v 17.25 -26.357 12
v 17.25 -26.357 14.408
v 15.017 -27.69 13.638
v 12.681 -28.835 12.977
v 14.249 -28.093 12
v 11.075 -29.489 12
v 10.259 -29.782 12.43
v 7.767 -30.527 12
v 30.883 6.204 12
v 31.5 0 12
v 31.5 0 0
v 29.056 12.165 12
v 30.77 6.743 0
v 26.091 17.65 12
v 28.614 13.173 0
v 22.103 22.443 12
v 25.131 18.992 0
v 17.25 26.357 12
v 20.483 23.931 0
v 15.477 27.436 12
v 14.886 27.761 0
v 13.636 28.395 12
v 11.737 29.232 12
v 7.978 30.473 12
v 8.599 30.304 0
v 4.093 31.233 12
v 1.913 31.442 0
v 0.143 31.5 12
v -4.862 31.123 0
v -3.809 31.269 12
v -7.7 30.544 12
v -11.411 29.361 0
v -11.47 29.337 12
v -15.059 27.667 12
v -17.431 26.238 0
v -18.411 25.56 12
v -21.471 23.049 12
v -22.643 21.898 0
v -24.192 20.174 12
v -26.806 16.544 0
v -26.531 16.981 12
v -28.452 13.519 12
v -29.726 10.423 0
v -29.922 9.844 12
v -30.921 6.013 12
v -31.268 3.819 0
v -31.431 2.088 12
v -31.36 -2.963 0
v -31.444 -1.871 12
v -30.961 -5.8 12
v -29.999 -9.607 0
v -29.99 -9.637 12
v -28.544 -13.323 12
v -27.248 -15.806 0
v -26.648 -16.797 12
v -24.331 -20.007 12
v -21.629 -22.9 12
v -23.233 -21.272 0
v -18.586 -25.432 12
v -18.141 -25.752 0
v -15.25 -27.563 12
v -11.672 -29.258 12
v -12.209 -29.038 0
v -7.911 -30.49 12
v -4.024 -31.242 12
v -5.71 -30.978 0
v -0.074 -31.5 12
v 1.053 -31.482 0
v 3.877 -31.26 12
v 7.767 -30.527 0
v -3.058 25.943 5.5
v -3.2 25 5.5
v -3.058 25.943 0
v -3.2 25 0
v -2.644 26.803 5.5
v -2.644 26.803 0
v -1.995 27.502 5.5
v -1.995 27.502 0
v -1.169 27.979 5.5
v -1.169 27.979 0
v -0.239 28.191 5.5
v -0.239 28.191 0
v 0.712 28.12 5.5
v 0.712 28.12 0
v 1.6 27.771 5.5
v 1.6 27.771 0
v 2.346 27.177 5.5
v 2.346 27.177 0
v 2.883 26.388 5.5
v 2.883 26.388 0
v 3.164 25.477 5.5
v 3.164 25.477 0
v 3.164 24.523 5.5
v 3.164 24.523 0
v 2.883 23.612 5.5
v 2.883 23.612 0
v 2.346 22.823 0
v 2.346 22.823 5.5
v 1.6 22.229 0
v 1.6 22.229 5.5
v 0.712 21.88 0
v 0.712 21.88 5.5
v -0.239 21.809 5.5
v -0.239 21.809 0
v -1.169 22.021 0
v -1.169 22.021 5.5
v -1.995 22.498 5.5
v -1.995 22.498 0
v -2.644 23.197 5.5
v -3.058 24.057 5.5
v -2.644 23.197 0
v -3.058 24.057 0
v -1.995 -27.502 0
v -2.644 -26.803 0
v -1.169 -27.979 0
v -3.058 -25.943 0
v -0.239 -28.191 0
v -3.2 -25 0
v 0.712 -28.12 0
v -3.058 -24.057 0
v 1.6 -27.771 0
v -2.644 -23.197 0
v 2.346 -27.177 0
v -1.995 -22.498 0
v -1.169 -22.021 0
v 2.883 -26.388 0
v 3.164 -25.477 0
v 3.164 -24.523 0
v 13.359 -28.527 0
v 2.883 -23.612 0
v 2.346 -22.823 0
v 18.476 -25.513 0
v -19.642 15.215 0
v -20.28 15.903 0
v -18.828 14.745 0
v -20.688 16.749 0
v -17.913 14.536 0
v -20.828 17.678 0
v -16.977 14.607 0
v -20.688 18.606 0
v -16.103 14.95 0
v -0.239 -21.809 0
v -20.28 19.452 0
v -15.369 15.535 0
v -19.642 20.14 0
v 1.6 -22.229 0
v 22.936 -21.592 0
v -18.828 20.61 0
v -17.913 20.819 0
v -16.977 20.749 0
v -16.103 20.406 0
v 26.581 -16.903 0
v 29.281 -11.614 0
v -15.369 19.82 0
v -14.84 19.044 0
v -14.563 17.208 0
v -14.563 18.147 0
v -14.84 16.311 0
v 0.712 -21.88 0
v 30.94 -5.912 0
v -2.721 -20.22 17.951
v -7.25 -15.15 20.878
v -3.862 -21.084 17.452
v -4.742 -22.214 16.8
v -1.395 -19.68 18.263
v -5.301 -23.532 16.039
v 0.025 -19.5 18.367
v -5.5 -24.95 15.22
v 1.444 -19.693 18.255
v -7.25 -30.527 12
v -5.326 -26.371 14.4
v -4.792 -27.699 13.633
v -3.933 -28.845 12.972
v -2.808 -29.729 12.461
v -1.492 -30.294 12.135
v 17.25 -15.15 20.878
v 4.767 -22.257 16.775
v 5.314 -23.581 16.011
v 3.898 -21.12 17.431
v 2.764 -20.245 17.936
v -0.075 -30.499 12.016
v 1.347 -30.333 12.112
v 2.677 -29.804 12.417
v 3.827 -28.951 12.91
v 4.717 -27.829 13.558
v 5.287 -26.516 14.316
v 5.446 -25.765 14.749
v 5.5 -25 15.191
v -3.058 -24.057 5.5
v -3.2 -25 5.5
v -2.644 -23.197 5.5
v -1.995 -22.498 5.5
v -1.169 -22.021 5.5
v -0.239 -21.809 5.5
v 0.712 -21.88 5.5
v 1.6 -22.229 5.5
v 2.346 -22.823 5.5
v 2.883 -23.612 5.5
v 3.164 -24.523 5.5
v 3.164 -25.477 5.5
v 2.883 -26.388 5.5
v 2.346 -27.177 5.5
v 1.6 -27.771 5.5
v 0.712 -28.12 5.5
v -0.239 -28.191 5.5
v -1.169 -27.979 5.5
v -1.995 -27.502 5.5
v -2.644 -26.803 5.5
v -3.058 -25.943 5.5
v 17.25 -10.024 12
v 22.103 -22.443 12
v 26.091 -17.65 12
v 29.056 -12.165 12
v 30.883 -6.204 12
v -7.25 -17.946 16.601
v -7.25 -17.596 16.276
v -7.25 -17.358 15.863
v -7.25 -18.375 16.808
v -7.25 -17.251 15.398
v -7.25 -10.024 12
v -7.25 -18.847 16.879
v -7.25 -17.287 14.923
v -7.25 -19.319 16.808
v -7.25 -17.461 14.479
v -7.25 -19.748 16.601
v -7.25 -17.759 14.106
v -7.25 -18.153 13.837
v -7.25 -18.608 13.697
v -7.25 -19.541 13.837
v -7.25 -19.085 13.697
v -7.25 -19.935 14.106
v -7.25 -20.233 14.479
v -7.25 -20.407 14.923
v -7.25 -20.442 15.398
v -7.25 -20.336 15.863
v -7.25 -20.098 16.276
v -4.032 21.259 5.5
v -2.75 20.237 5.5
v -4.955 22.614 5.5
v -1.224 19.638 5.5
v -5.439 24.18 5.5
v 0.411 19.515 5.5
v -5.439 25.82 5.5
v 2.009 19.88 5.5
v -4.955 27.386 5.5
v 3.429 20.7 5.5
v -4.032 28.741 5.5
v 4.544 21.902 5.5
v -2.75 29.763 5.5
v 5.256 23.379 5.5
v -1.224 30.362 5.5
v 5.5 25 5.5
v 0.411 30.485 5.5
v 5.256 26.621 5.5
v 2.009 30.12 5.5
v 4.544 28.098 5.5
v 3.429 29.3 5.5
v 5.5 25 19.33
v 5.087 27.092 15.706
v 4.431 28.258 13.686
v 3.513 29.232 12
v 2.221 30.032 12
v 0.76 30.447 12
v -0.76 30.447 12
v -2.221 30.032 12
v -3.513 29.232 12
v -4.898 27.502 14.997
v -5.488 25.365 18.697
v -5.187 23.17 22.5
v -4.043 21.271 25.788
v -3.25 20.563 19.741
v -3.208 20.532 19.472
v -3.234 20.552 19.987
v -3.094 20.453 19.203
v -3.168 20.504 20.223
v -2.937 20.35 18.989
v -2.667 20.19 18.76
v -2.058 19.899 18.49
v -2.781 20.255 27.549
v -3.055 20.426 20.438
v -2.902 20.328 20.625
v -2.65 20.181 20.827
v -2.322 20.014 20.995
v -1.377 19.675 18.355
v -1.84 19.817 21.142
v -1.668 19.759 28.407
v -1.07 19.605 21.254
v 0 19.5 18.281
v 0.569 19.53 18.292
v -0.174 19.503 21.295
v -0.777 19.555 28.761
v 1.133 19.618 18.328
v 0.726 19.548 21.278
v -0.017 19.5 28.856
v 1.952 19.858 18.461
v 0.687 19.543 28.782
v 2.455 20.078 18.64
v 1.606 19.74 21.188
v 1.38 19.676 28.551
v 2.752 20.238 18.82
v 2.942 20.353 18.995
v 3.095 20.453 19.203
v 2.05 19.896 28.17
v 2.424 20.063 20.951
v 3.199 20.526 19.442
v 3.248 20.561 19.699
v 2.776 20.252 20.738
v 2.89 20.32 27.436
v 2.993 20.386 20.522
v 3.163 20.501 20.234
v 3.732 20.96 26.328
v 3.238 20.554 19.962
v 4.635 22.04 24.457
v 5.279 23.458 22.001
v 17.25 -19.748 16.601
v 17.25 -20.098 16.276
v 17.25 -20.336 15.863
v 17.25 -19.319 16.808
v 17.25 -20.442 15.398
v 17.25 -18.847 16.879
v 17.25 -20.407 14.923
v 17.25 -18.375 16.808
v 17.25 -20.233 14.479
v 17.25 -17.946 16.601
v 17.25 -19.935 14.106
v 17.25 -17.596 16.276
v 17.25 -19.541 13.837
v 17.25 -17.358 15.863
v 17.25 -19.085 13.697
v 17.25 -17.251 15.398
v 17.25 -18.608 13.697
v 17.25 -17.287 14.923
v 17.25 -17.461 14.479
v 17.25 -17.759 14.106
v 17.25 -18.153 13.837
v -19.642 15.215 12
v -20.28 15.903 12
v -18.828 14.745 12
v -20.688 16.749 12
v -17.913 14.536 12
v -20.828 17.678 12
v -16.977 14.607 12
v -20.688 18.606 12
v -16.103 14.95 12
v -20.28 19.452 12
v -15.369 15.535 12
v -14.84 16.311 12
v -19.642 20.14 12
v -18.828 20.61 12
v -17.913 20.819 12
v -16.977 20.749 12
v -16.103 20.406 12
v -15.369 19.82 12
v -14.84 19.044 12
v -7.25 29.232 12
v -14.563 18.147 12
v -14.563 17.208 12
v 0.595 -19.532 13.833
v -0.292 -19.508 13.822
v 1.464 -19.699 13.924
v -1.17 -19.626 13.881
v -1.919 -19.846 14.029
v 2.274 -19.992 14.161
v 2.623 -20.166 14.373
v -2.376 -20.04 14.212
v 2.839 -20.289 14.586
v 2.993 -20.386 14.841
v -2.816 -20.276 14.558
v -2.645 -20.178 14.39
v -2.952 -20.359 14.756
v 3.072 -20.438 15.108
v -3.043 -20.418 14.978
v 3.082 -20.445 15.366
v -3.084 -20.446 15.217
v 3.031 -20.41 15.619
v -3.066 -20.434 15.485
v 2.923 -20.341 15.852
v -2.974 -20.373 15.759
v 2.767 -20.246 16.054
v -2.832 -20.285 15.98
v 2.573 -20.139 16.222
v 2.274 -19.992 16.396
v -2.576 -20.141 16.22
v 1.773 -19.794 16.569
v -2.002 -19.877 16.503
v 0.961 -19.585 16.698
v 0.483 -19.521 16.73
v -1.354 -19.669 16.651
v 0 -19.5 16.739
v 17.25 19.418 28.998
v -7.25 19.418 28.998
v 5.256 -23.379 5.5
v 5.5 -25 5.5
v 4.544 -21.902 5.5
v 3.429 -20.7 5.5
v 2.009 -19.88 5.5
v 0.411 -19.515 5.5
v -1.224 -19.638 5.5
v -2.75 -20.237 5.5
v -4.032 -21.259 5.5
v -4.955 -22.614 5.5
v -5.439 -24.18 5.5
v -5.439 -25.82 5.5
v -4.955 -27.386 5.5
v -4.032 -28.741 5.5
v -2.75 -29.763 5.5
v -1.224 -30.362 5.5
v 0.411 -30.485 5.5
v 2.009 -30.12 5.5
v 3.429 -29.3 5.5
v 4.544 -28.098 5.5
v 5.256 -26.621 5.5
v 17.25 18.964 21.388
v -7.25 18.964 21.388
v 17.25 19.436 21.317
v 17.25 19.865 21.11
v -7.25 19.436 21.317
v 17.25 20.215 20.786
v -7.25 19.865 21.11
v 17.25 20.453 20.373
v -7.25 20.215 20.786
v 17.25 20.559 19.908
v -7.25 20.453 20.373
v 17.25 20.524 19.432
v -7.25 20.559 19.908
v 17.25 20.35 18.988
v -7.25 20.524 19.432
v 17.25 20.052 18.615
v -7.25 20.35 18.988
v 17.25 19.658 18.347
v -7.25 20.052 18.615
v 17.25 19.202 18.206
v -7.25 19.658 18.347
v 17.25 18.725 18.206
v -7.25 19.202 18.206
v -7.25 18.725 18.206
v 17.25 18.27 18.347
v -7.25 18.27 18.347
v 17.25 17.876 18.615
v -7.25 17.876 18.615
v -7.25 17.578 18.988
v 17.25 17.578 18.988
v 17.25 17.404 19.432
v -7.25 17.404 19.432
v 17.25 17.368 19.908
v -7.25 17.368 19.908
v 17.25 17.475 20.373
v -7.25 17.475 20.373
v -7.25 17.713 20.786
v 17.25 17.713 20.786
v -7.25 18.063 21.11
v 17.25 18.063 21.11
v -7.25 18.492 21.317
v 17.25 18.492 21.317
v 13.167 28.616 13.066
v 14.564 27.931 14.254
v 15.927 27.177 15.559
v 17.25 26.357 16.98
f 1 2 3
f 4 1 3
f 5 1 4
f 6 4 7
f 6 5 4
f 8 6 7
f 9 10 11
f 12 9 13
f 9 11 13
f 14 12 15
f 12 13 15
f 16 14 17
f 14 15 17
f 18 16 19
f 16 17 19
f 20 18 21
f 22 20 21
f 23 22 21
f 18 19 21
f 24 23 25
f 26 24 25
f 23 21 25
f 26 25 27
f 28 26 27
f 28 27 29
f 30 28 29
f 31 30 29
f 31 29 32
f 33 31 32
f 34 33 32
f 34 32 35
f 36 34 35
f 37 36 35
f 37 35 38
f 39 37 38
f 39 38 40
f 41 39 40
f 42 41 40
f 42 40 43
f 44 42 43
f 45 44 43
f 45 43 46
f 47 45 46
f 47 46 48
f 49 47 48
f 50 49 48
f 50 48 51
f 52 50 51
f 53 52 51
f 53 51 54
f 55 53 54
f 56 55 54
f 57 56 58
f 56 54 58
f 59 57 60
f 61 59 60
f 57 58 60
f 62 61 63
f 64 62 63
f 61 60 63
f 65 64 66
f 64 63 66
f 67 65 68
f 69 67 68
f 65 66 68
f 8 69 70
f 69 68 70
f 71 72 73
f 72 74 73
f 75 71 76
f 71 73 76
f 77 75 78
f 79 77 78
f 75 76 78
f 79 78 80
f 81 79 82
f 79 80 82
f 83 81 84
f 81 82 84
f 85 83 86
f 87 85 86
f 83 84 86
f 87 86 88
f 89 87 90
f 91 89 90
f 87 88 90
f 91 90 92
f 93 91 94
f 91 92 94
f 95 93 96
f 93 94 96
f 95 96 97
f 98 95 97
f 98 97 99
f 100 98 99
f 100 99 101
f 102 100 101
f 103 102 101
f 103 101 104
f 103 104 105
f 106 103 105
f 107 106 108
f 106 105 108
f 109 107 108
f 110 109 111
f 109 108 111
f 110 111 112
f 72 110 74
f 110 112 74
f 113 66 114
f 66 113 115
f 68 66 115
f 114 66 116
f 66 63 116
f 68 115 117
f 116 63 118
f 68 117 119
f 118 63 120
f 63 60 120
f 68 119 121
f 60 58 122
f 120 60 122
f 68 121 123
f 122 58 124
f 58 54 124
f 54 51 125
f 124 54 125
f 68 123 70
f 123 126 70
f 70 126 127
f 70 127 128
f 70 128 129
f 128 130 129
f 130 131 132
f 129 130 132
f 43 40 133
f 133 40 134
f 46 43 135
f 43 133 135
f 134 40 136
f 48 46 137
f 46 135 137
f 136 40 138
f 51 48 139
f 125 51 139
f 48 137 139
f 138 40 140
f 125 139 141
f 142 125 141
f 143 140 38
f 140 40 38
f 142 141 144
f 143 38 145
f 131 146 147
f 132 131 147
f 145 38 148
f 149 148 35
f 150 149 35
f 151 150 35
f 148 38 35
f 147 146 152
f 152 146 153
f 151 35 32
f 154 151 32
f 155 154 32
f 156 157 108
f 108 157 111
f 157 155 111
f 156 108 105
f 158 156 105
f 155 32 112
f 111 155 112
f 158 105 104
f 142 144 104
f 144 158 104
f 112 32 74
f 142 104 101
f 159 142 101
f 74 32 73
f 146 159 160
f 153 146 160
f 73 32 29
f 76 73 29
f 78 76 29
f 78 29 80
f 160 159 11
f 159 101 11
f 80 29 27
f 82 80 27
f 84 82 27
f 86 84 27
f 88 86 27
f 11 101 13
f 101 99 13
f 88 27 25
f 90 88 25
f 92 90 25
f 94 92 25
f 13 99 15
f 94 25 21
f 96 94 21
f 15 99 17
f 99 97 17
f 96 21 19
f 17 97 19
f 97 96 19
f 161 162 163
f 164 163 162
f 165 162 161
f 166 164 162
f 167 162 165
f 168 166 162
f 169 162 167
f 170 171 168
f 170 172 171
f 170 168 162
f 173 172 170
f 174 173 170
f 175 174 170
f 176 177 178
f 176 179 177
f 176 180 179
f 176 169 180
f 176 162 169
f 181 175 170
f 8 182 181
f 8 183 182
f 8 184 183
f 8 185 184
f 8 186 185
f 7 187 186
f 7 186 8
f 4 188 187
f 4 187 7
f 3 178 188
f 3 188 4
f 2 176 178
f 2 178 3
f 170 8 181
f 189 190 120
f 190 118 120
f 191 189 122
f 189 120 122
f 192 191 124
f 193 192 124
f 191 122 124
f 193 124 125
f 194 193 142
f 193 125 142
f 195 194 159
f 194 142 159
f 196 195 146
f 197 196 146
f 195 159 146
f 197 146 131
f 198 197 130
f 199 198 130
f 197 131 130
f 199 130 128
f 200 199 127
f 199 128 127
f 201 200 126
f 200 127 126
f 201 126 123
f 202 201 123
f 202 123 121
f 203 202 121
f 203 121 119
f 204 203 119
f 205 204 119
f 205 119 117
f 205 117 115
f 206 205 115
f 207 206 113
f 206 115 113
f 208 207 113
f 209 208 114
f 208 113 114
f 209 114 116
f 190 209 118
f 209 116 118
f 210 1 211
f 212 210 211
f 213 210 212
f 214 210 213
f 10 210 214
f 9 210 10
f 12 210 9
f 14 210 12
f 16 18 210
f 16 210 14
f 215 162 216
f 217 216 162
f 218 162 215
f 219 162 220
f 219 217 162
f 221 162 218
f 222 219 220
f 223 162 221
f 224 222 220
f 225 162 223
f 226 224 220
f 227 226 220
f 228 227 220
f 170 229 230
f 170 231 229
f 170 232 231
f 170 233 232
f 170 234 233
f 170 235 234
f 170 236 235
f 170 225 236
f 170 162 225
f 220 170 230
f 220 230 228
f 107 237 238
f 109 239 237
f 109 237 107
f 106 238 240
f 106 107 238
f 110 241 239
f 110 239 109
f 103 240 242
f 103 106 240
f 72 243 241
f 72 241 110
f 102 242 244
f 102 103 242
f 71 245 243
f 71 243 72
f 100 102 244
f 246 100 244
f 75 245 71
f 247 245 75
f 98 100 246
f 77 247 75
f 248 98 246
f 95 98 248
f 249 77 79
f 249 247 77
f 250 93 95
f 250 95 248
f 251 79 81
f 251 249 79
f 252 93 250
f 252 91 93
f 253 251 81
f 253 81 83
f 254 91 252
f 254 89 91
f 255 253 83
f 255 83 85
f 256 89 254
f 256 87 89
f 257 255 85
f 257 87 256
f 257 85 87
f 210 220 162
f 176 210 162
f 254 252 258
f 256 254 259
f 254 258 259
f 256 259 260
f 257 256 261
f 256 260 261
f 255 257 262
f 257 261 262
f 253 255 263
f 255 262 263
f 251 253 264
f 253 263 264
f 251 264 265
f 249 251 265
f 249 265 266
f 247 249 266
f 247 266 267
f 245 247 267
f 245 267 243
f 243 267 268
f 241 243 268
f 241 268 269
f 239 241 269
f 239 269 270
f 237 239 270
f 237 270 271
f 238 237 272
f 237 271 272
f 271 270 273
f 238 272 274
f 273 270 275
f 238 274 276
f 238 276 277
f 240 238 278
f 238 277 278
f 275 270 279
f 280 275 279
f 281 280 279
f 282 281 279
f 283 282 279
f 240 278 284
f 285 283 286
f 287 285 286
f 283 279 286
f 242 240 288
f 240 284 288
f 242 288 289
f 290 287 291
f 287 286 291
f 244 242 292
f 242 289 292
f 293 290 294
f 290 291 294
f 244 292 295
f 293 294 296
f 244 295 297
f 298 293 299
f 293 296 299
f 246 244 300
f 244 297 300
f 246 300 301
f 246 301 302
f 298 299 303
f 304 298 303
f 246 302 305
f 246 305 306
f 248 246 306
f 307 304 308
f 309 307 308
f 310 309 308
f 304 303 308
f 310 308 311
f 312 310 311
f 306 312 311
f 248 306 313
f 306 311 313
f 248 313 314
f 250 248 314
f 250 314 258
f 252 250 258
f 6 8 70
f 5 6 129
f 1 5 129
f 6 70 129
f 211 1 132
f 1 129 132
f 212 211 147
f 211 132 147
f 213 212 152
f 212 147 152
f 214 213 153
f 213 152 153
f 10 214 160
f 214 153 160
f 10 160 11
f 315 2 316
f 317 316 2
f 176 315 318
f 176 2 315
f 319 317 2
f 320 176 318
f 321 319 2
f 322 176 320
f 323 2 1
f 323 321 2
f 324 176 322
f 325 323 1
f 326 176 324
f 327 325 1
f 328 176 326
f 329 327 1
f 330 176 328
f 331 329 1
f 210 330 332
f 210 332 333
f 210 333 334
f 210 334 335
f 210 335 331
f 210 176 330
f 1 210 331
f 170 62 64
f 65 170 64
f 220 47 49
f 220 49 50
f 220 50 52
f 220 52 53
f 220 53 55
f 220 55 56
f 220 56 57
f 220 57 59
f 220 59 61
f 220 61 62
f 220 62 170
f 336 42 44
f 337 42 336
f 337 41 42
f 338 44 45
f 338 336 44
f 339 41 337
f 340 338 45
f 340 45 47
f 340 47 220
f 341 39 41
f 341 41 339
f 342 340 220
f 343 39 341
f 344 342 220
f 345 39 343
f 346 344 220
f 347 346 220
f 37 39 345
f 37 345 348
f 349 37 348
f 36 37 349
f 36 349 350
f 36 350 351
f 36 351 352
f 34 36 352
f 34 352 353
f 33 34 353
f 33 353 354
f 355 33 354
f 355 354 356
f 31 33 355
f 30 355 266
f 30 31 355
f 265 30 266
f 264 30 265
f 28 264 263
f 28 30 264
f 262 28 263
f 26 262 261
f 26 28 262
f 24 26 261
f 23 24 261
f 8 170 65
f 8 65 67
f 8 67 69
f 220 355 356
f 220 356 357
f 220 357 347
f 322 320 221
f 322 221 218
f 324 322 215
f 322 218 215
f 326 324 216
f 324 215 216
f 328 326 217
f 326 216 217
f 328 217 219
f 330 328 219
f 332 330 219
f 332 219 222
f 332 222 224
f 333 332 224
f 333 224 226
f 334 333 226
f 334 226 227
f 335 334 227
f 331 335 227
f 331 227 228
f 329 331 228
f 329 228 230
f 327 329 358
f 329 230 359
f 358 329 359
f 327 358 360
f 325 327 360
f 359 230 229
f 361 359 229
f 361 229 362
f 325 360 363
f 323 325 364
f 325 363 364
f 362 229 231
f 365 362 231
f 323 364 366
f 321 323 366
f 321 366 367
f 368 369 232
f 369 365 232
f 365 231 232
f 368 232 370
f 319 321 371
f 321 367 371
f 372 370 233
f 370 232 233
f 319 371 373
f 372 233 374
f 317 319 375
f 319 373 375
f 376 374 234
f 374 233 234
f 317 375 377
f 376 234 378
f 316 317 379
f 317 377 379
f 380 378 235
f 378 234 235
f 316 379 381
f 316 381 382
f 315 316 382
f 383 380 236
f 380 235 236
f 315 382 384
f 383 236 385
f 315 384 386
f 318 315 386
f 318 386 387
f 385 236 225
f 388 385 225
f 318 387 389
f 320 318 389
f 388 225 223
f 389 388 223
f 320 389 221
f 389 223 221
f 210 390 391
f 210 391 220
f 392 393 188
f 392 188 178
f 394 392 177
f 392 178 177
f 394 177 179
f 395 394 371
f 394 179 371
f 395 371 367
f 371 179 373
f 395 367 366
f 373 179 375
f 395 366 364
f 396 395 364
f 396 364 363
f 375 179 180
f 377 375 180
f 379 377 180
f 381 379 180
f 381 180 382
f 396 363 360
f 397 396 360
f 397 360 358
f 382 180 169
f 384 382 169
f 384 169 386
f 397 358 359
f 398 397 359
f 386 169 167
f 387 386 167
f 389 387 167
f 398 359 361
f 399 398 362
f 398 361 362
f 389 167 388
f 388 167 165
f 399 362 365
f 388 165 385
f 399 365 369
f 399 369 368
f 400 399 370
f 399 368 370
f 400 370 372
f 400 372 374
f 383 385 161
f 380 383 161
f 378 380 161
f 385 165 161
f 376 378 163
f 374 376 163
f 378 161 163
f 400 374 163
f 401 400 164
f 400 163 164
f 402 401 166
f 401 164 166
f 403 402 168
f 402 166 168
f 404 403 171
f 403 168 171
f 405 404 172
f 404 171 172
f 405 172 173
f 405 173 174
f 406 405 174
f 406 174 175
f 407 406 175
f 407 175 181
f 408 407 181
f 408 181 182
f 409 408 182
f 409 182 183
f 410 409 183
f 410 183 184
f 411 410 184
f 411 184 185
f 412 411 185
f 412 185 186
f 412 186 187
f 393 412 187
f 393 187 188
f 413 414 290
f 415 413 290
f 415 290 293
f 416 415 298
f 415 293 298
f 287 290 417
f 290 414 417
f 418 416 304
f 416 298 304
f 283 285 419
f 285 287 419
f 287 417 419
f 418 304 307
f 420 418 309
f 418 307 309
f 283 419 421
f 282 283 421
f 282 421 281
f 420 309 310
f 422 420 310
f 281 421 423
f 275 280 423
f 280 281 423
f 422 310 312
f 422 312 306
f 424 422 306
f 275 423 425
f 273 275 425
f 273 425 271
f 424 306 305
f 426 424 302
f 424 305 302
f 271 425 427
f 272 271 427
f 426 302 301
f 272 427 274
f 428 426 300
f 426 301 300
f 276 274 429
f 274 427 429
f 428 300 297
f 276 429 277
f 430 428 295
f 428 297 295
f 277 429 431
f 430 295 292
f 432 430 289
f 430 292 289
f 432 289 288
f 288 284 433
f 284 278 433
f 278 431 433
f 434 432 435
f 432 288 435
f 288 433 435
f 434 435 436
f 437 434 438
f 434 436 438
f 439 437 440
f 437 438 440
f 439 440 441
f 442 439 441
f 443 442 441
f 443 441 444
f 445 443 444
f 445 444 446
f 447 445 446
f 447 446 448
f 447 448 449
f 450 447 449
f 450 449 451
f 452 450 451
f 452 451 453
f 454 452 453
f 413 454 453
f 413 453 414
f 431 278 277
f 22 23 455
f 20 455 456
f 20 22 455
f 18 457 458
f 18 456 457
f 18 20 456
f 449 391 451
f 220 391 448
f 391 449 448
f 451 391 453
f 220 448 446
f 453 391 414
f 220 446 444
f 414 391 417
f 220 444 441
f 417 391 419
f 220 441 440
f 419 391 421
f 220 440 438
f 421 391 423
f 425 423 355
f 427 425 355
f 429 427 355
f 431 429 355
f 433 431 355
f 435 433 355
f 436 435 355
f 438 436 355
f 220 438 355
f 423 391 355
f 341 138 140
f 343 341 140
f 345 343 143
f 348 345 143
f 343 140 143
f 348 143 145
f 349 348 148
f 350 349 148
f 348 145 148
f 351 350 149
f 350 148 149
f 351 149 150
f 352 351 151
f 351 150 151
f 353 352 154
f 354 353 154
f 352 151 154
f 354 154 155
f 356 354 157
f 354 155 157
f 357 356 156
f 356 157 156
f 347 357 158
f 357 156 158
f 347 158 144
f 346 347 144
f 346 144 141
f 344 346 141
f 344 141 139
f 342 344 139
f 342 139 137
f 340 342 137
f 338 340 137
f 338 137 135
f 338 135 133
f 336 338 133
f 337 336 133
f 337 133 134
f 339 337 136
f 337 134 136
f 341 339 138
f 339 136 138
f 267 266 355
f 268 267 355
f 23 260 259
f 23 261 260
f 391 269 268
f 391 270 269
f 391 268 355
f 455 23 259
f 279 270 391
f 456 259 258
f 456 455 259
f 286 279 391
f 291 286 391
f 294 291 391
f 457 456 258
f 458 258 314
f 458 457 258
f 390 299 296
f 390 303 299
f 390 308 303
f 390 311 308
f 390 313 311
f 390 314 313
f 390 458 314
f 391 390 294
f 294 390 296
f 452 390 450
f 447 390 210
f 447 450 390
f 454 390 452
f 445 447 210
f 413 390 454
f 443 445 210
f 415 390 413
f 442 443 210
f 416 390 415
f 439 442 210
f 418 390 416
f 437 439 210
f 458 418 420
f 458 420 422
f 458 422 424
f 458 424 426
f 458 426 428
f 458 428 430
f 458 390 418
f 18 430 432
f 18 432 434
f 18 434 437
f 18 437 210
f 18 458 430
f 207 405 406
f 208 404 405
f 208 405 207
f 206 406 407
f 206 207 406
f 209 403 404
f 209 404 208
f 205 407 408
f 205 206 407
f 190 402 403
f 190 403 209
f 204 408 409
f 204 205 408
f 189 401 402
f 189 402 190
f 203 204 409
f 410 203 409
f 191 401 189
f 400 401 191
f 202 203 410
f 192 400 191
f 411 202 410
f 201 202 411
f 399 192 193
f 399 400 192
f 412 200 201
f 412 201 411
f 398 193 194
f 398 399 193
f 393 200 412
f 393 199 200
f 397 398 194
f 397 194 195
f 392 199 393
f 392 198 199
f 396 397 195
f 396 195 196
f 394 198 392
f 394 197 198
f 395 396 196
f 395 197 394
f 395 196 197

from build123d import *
from build123d.topology import SkipClean

# Parameters (mm, degrees)
SKETCH2_R                      = 31.5
BOSS_EXTRUDE1_DEPTH            = 12
CBORE_FOR_M6_SHCS1_D           = 6.4
CBORE_FOR_M6_SHCS1_CBORE_D     = 11
CBORE_FOR_M6_SHCS1_CBORE_DEPTH = 6.5
SKETCH5_R                      = 3.15
CUT_EXTRUDE1_DEPTH             = 12
BOSS_EXTRUDE2_DEPTH            = 24.5
CUT_EXTRUDE2_START             = 65
SKETCH7_R                      = 5.5
CUT_EXTRUDE2_DEPTH             = 65
BOSS_EXTRUDE3_REACH            = 66.882
CUT_EXTRUDE3_START             = 82
SKETCH9_R                      = 5.5
CUT_EXTRUDE3_DEPTH             = 82
SKETCH11_R                     = 51.4472096
SKETCH11_R_2                   = 31.5
CUT_EXTRUDE4_DEPTH             = 82
SKETCH12_R                     = 1.6
CUT_EXTRUDE5_DEPTH             = 52


with BuildPart() as part:
    # Sketch2 → Boss-Extrude1 (new body)
    with BuildSketch(Plane.XY):
        Circle(SKETCH2_R)
    extrude(amount=BOSS_EXTRUDE1_DEPTH)

    # CBORE for M6 SHCS1 (through all)
    with Locations(Plane.XY.offset(12)):
        with Locations((0, 25), (0, -25)):
            CounterBoreHole(CBORE_FOR_M6_SHCS1_D / 2, CBORE_FOR_M6_SHCS1_CBORE_D / 2, CBORE_FOR_M6_SHCS1_CBORE_DEPTH)

    # Sketch5 → Cut-Extrude1 (cut)
    with BuildSketch(Plane(origin=(0, 0, 0), x_dir=(-1, 0, 0), z_dir=(0, 0, -1))):
        with Locations((17.67766953, 17.67766953)):
            Circle(SKETCH5_R)
    extrude(amount=-CUT_EXTRUDE1_DEPTH, mode=Mode.SUBTRACT)

    # Sketch6 → Boss-Extrude2 (add)
    with BuildSketch(Plane(origin=(17.25, 0, 0), x_dir=(0, 0, -1), z_dir=(1, 0, 0))):
        Polygon((-12, 29.231895539), (-28.9984059, 19.417861316), (-12, -10.02424135), align=None)
    extrude(amount=-BOSS_EXTRUDE2_DEPTH)

    # Sketch7 → Cut-Extrude2 (cut)
    with BuildSketch(Plane.XY.offset(12).offset(CUT_EXTRUDE2_START)):
        with Locations((0, 25)):
            Circle(SKETCH7_R)
    extrude(amount=-CUT_EXTRUDE2_DEPTH, mode=Mode.SUBTRACT)

    # Boss-Extrude3: up to this face of the body (flat: up to its plane)
    boss_extrude3_end = Plane(part.part.faces().sort_by_distance((-7.25, 12.875171835, 17.6661353))[0])
    # Sketch8 → Boss-Extrude3 (add, up to the picked face)
    with BuildSketch(Plane(origin=(17.25, 0, 0), x_dir=(0, 0, -1), z_dir=(1, 0, 0)), mode=Mode.PRIVATE) as boss_extrude3_sk1:
        Polygon((-12, -10.02424135), (-20.878095029, -15.150011905), (-12, -30.52732357), align=None)
    boss_extrude3_tool1 = split(extrude(boss_extrude3_sk1.sketch, amount=-BOSS_EXTRUDE3_REACH, mode=Mode.PRIVATE), bisect_by=boss_extrude3_end, keep=Keep.BOTH, mode=Mode.PRIVATE)
    add(boss_extrude3_tool1.solids().sort_by(Axis((17.25, -18.567192, 14.959365), (-1, 0, 0)))[0])

    # Sketch9 → Cut-Extrude3 (cut)
    with BuildSketch(Plane.XY.offset(12).offset(CUT_EXTRUDE3_START)):
        with Locations((0, -25)):
            Circle(SKETCH9_R)
    extrude(amount=-CUT_EXTRUDE3_DEPTH, mode=Mode.SUBTRACT)

    # Sketch11 → Cut-Extrude4 (cut)
    with SkipClean():  # the faces are left unmerged after this step: merging them gives an invalid solid
        with BuildSketch(Plane(origin=(0, 0, 0), x_dir=(-1, 0, 0), z_dir=(0, 0, -1))):
            Circle(SKETCH11_R)
            with Locations(Location((0, 0, 0), (0, 0, 255.72452839))):
                Circle(SKETCH11_R_2, mode=Mode.SUBTRACT)
        extrude(amount=-CUT_EXTRUDE4_DEPTH, mode=Mode.SUBTRACT)
    add(part.part.scale(1), mode=Mode.REPLACE)  # the faces are merged on a copy

    # Sketch12 → Cut-Extrude5 (cut)
    with BuildSketch(Plane.ZY.offset(7.25)):
        with Locations((19.788303121, 18.963925862)):
            Circle(SKETCH12_R)
        with Locations((15.278684177, -18.84696327)):
            Circle(SKETCH12_R)
    extrude(amount=-CUT_EXTRUDE5_DEPTH, mode=Mode.SUBTRACT)


solid = part.part
